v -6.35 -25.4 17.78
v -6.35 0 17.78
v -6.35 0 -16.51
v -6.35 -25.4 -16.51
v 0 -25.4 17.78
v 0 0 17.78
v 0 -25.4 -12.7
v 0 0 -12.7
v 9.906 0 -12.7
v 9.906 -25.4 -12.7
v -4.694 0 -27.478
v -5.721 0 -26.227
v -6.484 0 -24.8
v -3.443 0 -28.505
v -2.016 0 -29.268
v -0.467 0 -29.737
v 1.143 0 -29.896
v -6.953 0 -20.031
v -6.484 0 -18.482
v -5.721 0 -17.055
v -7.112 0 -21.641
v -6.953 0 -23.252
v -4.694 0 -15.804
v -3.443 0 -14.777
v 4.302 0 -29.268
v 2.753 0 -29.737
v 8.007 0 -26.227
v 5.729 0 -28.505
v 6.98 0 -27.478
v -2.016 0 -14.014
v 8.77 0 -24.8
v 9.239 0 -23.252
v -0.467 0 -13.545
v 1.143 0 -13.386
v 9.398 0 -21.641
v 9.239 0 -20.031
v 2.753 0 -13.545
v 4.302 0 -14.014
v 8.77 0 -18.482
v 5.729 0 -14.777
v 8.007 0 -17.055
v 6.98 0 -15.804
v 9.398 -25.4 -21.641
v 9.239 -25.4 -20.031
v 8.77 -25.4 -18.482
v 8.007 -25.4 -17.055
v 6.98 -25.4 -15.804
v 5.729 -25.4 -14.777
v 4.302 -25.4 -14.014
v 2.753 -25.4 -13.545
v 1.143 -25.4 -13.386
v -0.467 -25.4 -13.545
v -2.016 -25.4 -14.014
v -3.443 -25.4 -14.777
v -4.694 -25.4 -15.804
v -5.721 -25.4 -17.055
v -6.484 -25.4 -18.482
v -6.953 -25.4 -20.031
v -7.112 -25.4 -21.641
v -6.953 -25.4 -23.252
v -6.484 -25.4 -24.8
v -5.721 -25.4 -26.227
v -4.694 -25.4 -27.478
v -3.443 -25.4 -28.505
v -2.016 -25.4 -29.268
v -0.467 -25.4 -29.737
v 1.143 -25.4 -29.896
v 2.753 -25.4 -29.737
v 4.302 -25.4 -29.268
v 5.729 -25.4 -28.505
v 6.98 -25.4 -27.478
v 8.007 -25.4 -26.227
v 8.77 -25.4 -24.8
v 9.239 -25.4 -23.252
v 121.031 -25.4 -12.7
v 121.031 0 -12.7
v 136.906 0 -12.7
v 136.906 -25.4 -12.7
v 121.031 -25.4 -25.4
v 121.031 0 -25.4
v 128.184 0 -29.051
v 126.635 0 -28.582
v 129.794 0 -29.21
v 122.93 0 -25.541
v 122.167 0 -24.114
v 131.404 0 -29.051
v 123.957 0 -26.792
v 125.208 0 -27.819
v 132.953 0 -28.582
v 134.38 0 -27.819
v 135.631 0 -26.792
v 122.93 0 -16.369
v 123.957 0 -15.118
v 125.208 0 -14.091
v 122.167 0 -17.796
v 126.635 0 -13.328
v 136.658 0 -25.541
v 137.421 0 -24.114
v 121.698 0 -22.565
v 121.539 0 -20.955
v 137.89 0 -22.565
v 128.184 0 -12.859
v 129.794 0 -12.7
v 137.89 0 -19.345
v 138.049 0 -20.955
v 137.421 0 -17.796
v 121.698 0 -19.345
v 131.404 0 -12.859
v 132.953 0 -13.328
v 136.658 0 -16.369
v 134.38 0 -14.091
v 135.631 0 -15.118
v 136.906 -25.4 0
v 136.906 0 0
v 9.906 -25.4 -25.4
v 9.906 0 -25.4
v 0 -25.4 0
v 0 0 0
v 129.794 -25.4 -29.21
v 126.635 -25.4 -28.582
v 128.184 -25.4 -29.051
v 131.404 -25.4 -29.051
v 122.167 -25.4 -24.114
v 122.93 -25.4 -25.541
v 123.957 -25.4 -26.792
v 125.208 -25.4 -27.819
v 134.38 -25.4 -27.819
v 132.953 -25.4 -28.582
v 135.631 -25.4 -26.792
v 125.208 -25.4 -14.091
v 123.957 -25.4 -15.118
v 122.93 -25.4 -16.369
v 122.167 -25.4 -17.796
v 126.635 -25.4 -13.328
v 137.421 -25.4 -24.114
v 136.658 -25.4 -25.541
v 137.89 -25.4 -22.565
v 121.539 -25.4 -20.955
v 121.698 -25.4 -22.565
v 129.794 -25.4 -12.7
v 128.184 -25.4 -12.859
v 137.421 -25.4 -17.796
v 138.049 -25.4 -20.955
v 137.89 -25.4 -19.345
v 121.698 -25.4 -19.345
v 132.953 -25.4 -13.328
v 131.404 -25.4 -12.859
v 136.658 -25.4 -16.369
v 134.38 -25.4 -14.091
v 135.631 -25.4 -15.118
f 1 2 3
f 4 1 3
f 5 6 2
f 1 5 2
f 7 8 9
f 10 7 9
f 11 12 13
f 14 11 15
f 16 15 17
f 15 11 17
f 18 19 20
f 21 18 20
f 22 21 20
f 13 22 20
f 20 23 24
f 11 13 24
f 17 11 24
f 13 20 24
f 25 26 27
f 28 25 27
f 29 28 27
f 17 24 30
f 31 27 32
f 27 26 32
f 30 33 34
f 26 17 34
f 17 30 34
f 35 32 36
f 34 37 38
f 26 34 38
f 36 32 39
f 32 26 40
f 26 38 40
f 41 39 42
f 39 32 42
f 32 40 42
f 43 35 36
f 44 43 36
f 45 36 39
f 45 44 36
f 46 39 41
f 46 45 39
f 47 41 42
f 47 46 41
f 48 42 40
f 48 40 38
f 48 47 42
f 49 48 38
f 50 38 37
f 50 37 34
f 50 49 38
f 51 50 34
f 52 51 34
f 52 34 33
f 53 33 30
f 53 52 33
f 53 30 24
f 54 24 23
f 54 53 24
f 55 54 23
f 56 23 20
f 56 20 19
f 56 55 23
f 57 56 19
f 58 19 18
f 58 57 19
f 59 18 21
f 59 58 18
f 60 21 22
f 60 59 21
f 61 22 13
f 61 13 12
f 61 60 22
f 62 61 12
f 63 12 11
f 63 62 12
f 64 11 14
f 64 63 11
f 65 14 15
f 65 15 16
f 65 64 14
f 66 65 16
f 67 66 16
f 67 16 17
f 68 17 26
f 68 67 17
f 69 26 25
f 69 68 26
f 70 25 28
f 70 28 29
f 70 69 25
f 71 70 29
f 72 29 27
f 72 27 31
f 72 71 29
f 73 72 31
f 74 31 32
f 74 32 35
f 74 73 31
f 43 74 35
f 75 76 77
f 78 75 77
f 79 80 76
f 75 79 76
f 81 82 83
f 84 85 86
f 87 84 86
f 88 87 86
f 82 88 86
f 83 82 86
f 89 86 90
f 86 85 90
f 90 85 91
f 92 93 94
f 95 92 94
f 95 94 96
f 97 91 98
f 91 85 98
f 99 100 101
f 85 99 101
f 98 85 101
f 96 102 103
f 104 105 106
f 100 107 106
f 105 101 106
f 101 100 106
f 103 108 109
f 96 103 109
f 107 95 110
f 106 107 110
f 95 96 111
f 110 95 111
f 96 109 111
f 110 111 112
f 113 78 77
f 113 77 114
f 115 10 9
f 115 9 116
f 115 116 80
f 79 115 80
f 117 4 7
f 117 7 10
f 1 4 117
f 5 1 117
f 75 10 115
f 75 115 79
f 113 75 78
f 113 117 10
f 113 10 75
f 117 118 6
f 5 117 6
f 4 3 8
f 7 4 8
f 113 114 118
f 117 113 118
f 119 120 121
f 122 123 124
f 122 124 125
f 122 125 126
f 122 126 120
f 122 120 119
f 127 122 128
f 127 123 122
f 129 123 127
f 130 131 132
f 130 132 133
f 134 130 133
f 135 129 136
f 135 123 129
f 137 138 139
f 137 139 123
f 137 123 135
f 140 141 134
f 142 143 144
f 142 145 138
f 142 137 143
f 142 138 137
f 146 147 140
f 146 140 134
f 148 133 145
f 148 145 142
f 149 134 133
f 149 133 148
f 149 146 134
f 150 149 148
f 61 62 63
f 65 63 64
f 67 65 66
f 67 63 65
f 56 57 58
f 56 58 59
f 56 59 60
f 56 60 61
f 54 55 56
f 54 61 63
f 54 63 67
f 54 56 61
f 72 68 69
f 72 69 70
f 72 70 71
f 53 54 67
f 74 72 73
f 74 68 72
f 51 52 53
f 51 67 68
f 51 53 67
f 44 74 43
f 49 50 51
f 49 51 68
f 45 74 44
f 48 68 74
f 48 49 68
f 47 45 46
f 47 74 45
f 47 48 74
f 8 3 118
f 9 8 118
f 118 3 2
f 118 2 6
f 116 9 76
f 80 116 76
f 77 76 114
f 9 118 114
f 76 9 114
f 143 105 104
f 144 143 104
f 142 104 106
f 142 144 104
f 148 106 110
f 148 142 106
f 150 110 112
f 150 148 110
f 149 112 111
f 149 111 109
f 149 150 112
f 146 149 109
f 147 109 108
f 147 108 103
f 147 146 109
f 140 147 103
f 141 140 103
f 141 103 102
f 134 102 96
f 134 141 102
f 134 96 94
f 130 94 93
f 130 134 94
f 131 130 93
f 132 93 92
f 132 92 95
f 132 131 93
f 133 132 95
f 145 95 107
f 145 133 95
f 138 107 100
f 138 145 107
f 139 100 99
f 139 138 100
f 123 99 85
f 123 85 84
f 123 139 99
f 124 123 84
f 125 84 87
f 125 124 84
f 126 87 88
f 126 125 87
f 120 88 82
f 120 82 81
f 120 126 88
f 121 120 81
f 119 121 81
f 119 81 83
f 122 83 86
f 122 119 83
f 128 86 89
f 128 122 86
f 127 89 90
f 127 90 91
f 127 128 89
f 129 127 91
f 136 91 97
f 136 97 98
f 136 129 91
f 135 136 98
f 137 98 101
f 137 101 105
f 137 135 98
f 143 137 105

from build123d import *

# Parameters (mm, degrees)
F1_DEPTH = 25.4
F3_DEPTH = 25.4
F4_R     = 8.255
F5_DEPTH = 25.4
F6_R     = 8.255
F7_DEPTH = 25.4


with BuildPart() as f1:
    # F0 (on Front) → F1 (new body)
    with BuildSketch(Plane.XZ):
        Polygon((136.906, 0), (0, 0), (0, -12.7), (9.906, -12.7), (9.906, -25.4), (121.031, -25.4), (121.031, -12.7), (136.906, -12.7), align=None)
    extrude(amount=F1_DEPTH)

    # F2 (on Front) → F3 (join)
    with BuildSketch(Plane.XZ):
        Polygon((-6.35, -16.51), (0, -12.7), (0, 17.78), (-6.35, 17.78), align=None)
    extrude(amount=F3_DEPTH)


with BuildPart() as f5:
    # F4 (on face) → F5 (new body)
    with BuildSketch(Plane.XZ.offset(25.4)):
        with Locations((1.143, -21.641102)):
            Circle(F4_R)
    extrude(amount=-F5_DEPTH)


with BuildPart() as f7:
    # F6 (on face) → F7 (new body)
    with BuildSketch(Plane.XZ.offset(25.4)):
        with Locations((129.794, -20.955)):
            Circle(F6_R)
    extrude(amount=-F7_DEPTH)


solid = Compound([f1.part, f5.part, f7.part])
